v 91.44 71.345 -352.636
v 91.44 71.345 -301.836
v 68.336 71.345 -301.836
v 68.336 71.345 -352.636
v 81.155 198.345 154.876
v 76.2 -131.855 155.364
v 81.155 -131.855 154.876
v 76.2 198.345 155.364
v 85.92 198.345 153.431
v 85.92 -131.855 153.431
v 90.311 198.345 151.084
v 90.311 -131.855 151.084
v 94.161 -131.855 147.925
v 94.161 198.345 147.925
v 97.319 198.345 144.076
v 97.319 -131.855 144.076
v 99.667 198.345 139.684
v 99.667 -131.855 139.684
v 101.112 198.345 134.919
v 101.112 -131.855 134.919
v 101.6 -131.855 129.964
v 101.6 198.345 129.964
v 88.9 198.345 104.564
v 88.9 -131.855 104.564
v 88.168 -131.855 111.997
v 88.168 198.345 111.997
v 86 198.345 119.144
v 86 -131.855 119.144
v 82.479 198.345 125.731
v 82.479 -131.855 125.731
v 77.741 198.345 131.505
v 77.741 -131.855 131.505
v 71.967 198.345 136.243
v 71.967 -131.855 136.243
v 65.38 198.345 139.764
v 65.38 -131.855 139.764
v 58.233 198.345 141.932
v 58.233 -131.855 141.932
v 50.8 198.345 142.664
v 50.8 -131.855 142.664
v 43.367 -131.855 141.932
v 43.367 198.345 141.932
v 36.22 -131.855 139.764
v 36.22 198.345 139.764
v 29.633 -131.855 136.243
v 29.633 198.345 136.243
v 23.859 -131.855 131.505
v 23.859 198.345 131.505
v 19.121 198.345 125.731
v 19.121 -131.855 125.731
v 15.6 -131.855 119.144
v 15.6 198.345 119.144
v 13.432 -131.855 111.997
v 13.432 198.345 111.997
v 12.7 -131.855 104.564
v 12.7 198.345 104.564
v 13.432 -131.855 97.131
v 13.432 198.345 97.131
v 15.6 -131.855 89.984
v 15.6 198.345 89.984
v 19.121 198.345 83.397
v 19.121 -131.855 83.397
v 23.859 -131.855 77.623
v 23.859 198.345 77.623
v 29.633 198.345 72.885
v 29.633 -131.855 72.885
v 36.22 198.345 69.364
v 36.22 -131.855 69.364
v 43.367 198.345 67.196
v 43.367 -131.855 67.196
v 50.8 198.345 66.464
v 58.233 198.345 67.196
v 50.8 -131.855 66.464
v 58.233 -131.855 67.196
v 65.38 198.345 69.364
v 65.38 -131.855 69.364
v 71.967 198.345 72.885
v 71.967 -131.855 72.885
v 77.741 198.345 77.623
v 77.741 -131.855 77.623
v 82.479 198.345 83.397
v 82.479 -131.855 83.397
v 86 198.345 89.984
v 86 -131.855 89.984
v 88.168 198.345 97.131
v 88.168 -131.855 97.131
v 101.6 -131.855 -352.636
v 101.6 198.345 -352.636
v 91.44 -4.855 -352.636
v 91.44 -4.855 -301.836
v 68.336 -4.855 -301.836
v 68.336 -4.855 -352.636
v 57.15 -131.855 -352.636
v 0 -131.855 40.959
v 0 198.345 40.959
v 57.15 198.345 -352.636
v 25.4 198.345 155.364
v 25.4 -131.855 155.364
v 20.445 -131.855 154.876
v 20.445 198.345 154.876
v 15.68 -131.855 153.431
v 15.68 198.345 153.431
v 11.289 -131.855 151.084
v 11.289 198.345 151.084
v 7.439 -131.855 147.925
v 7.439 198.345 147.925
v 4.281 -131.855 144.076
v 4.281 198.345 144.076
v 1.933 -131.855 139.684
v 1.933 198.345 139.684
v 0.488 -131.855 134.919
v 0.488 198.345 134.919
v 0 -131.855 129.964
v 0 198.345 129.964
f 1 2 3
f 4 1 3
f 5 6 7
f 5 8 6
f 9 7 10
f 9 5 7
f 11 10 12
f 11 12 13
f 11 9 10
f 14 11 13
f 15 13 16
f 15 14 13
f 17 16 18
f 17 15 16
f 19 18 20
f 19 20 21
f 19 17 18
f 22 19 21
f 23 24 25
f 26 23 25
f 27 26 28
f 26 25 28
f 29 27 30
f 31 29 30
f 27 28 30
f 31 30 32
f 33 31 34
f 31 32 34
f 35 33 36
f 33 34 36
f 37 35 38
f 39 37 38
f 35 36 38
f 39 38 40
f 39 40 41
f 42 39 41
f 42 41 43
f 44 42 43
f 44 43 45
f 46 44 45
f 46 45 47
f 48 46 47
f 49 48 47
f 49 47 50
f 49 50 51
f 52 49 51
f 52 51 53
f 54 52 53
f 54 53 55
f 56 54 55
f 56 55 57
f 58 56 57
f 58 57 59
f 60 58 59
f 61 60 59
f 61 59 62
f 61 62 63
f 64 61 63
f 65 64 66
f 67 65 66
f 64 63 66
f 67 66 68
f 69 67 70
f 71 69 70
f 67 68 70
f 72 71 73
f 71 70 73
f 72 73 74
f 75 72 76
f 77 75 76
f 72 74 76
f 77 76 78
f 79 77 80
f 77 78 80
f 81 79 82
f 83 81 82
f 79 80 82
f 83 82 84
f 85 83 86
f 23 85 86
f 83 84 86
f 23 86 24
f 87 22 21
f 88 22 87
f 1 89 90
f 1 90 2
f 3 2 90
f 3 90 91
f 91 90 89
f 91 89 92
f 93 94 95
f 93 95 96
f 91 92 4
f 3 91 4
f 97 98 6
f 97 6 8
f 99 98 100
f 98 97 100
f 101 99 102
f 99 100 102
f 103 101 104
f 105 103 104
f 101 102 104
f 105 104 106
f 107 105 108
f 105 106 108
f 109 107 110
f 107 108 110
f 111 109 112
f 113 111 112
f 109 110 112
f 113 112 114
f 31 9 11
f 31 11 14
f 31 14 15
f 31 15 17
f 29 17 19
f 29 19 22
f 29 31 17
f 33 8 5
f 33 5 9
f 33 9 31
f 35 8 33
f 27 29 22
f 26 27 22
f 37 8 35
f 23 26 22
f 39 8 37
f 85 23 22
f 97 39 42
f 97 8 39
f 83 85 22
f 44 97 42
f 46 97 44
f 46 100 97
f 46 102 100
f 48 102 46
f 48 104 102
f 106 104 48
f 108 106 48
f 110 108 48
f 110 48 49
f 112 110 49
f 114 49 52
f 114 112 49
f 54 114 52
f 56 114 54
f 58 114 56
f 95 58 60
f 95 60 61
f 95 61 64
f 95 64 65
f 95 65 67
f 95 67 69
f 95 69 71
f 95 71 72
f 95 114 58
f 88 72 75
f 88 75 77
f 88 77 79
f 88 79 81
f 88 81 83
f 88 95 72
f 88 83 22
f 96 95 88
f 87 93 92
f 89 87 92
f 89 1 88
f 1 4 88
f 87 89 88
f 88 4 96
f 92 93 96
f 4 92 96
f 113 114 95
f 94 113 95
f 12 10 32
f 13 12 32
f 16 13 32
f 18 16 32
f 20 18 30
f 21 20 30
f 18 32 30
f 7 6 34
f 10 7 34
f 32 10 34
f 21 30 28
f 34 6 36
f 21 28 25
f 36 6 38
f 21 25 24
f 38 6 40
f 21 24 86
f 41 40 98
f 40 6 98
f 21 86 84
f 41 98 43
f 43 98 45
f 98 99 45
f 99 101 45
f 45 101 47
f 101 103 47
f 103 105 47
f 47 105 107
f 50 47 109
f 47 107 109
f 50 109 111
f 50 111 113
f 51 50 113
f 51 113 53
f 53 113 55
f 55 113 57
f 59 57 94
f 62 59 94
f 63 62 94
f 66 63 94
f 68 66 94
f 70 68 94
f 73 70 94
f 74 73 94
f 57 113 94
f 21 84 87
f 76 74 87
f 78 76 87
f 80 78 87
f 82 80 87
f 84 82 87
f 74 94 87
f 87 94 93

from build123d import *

# Parameters (mm, degrees)
SKETCH2_W           = 508
SKETCH2_H           = 330.2
BOSS_EXTRUDE1_DEPTH = 101.6
SKETCH3_R           = 38.1
CUT_EXTRUDE1_DEPTH  = 331.2
FILLET1_R           = 25.4
CUT_EXTRUDE2_DEPTH  = 331.2
SKETCH5_W           = 23.104275201
SKETCH5_H           = 76.2
CUT_EXTRUDE3_DEPTH  = 50.8


with BuildPart() as part:
    # Sketch2 → Boss-Extrude1 (new body)
    with BuildSketch(Plane(origin=(0, 0, 0), x_dir=(0, 0, -1), z_dir=(1, 0, 0))):
        with Locations((98.635814889, 33.244869215)):
            Rectangle(SKETCH2_W, SKETCH2_H)
    extrude(amount=BOSS_EXTRUDE1_DEPTH)

    # Sketch3 → Cut-Extrude1 (cut, through all)
    with BuildSketch(Plane.XZ.offset(131.855130785)):
        with Locations((50.8, 104.564185111)):
            Circle(SKETCH3_R)
    extrude(amount=-CUT_EXTRUDE1_DEPTH, mode=Mode.SUBTRACT)

    # Fillet1
    fillet1_edges = [part.edges().sort_by_distance(p)[0] for p in [
        (101.6, 33.244869215, 155.364185111),
        (0, 33.244869215, 155.364185111),
    ]]
    fillet(fillet1_edges, radius=FILLET1_R)

    # Sketch4 → Cut-Extrude2 (cut, through all)
    with BuildSketch(Plane.XZ.offset(131.855130785)):
        Polygon((0, 40.959246462), (57.15, -352.635814889), (0, -352.635814889), align=None)
    extrude(amount=-CUT_EXTRUDE2_DEPTH, mode=Mode.SUBTRACT)

    # Sketch5 → Cut-Extrude3 (cut)
    with BuildSketch(Plane(origin=(0, 0, -352.635814889), x_dir=(-1, 0, 0), z_dir=(0, 0, -1))):
        with Locations((-79.8878624, 33.244869215)):
            Rectangle(SKETCH5_W, SKETCH5_H)
    extrude(amount=-CUT_EXTRUDE3_DEPTH, mode=Mode.SUBTRACT)


solid = part.part
